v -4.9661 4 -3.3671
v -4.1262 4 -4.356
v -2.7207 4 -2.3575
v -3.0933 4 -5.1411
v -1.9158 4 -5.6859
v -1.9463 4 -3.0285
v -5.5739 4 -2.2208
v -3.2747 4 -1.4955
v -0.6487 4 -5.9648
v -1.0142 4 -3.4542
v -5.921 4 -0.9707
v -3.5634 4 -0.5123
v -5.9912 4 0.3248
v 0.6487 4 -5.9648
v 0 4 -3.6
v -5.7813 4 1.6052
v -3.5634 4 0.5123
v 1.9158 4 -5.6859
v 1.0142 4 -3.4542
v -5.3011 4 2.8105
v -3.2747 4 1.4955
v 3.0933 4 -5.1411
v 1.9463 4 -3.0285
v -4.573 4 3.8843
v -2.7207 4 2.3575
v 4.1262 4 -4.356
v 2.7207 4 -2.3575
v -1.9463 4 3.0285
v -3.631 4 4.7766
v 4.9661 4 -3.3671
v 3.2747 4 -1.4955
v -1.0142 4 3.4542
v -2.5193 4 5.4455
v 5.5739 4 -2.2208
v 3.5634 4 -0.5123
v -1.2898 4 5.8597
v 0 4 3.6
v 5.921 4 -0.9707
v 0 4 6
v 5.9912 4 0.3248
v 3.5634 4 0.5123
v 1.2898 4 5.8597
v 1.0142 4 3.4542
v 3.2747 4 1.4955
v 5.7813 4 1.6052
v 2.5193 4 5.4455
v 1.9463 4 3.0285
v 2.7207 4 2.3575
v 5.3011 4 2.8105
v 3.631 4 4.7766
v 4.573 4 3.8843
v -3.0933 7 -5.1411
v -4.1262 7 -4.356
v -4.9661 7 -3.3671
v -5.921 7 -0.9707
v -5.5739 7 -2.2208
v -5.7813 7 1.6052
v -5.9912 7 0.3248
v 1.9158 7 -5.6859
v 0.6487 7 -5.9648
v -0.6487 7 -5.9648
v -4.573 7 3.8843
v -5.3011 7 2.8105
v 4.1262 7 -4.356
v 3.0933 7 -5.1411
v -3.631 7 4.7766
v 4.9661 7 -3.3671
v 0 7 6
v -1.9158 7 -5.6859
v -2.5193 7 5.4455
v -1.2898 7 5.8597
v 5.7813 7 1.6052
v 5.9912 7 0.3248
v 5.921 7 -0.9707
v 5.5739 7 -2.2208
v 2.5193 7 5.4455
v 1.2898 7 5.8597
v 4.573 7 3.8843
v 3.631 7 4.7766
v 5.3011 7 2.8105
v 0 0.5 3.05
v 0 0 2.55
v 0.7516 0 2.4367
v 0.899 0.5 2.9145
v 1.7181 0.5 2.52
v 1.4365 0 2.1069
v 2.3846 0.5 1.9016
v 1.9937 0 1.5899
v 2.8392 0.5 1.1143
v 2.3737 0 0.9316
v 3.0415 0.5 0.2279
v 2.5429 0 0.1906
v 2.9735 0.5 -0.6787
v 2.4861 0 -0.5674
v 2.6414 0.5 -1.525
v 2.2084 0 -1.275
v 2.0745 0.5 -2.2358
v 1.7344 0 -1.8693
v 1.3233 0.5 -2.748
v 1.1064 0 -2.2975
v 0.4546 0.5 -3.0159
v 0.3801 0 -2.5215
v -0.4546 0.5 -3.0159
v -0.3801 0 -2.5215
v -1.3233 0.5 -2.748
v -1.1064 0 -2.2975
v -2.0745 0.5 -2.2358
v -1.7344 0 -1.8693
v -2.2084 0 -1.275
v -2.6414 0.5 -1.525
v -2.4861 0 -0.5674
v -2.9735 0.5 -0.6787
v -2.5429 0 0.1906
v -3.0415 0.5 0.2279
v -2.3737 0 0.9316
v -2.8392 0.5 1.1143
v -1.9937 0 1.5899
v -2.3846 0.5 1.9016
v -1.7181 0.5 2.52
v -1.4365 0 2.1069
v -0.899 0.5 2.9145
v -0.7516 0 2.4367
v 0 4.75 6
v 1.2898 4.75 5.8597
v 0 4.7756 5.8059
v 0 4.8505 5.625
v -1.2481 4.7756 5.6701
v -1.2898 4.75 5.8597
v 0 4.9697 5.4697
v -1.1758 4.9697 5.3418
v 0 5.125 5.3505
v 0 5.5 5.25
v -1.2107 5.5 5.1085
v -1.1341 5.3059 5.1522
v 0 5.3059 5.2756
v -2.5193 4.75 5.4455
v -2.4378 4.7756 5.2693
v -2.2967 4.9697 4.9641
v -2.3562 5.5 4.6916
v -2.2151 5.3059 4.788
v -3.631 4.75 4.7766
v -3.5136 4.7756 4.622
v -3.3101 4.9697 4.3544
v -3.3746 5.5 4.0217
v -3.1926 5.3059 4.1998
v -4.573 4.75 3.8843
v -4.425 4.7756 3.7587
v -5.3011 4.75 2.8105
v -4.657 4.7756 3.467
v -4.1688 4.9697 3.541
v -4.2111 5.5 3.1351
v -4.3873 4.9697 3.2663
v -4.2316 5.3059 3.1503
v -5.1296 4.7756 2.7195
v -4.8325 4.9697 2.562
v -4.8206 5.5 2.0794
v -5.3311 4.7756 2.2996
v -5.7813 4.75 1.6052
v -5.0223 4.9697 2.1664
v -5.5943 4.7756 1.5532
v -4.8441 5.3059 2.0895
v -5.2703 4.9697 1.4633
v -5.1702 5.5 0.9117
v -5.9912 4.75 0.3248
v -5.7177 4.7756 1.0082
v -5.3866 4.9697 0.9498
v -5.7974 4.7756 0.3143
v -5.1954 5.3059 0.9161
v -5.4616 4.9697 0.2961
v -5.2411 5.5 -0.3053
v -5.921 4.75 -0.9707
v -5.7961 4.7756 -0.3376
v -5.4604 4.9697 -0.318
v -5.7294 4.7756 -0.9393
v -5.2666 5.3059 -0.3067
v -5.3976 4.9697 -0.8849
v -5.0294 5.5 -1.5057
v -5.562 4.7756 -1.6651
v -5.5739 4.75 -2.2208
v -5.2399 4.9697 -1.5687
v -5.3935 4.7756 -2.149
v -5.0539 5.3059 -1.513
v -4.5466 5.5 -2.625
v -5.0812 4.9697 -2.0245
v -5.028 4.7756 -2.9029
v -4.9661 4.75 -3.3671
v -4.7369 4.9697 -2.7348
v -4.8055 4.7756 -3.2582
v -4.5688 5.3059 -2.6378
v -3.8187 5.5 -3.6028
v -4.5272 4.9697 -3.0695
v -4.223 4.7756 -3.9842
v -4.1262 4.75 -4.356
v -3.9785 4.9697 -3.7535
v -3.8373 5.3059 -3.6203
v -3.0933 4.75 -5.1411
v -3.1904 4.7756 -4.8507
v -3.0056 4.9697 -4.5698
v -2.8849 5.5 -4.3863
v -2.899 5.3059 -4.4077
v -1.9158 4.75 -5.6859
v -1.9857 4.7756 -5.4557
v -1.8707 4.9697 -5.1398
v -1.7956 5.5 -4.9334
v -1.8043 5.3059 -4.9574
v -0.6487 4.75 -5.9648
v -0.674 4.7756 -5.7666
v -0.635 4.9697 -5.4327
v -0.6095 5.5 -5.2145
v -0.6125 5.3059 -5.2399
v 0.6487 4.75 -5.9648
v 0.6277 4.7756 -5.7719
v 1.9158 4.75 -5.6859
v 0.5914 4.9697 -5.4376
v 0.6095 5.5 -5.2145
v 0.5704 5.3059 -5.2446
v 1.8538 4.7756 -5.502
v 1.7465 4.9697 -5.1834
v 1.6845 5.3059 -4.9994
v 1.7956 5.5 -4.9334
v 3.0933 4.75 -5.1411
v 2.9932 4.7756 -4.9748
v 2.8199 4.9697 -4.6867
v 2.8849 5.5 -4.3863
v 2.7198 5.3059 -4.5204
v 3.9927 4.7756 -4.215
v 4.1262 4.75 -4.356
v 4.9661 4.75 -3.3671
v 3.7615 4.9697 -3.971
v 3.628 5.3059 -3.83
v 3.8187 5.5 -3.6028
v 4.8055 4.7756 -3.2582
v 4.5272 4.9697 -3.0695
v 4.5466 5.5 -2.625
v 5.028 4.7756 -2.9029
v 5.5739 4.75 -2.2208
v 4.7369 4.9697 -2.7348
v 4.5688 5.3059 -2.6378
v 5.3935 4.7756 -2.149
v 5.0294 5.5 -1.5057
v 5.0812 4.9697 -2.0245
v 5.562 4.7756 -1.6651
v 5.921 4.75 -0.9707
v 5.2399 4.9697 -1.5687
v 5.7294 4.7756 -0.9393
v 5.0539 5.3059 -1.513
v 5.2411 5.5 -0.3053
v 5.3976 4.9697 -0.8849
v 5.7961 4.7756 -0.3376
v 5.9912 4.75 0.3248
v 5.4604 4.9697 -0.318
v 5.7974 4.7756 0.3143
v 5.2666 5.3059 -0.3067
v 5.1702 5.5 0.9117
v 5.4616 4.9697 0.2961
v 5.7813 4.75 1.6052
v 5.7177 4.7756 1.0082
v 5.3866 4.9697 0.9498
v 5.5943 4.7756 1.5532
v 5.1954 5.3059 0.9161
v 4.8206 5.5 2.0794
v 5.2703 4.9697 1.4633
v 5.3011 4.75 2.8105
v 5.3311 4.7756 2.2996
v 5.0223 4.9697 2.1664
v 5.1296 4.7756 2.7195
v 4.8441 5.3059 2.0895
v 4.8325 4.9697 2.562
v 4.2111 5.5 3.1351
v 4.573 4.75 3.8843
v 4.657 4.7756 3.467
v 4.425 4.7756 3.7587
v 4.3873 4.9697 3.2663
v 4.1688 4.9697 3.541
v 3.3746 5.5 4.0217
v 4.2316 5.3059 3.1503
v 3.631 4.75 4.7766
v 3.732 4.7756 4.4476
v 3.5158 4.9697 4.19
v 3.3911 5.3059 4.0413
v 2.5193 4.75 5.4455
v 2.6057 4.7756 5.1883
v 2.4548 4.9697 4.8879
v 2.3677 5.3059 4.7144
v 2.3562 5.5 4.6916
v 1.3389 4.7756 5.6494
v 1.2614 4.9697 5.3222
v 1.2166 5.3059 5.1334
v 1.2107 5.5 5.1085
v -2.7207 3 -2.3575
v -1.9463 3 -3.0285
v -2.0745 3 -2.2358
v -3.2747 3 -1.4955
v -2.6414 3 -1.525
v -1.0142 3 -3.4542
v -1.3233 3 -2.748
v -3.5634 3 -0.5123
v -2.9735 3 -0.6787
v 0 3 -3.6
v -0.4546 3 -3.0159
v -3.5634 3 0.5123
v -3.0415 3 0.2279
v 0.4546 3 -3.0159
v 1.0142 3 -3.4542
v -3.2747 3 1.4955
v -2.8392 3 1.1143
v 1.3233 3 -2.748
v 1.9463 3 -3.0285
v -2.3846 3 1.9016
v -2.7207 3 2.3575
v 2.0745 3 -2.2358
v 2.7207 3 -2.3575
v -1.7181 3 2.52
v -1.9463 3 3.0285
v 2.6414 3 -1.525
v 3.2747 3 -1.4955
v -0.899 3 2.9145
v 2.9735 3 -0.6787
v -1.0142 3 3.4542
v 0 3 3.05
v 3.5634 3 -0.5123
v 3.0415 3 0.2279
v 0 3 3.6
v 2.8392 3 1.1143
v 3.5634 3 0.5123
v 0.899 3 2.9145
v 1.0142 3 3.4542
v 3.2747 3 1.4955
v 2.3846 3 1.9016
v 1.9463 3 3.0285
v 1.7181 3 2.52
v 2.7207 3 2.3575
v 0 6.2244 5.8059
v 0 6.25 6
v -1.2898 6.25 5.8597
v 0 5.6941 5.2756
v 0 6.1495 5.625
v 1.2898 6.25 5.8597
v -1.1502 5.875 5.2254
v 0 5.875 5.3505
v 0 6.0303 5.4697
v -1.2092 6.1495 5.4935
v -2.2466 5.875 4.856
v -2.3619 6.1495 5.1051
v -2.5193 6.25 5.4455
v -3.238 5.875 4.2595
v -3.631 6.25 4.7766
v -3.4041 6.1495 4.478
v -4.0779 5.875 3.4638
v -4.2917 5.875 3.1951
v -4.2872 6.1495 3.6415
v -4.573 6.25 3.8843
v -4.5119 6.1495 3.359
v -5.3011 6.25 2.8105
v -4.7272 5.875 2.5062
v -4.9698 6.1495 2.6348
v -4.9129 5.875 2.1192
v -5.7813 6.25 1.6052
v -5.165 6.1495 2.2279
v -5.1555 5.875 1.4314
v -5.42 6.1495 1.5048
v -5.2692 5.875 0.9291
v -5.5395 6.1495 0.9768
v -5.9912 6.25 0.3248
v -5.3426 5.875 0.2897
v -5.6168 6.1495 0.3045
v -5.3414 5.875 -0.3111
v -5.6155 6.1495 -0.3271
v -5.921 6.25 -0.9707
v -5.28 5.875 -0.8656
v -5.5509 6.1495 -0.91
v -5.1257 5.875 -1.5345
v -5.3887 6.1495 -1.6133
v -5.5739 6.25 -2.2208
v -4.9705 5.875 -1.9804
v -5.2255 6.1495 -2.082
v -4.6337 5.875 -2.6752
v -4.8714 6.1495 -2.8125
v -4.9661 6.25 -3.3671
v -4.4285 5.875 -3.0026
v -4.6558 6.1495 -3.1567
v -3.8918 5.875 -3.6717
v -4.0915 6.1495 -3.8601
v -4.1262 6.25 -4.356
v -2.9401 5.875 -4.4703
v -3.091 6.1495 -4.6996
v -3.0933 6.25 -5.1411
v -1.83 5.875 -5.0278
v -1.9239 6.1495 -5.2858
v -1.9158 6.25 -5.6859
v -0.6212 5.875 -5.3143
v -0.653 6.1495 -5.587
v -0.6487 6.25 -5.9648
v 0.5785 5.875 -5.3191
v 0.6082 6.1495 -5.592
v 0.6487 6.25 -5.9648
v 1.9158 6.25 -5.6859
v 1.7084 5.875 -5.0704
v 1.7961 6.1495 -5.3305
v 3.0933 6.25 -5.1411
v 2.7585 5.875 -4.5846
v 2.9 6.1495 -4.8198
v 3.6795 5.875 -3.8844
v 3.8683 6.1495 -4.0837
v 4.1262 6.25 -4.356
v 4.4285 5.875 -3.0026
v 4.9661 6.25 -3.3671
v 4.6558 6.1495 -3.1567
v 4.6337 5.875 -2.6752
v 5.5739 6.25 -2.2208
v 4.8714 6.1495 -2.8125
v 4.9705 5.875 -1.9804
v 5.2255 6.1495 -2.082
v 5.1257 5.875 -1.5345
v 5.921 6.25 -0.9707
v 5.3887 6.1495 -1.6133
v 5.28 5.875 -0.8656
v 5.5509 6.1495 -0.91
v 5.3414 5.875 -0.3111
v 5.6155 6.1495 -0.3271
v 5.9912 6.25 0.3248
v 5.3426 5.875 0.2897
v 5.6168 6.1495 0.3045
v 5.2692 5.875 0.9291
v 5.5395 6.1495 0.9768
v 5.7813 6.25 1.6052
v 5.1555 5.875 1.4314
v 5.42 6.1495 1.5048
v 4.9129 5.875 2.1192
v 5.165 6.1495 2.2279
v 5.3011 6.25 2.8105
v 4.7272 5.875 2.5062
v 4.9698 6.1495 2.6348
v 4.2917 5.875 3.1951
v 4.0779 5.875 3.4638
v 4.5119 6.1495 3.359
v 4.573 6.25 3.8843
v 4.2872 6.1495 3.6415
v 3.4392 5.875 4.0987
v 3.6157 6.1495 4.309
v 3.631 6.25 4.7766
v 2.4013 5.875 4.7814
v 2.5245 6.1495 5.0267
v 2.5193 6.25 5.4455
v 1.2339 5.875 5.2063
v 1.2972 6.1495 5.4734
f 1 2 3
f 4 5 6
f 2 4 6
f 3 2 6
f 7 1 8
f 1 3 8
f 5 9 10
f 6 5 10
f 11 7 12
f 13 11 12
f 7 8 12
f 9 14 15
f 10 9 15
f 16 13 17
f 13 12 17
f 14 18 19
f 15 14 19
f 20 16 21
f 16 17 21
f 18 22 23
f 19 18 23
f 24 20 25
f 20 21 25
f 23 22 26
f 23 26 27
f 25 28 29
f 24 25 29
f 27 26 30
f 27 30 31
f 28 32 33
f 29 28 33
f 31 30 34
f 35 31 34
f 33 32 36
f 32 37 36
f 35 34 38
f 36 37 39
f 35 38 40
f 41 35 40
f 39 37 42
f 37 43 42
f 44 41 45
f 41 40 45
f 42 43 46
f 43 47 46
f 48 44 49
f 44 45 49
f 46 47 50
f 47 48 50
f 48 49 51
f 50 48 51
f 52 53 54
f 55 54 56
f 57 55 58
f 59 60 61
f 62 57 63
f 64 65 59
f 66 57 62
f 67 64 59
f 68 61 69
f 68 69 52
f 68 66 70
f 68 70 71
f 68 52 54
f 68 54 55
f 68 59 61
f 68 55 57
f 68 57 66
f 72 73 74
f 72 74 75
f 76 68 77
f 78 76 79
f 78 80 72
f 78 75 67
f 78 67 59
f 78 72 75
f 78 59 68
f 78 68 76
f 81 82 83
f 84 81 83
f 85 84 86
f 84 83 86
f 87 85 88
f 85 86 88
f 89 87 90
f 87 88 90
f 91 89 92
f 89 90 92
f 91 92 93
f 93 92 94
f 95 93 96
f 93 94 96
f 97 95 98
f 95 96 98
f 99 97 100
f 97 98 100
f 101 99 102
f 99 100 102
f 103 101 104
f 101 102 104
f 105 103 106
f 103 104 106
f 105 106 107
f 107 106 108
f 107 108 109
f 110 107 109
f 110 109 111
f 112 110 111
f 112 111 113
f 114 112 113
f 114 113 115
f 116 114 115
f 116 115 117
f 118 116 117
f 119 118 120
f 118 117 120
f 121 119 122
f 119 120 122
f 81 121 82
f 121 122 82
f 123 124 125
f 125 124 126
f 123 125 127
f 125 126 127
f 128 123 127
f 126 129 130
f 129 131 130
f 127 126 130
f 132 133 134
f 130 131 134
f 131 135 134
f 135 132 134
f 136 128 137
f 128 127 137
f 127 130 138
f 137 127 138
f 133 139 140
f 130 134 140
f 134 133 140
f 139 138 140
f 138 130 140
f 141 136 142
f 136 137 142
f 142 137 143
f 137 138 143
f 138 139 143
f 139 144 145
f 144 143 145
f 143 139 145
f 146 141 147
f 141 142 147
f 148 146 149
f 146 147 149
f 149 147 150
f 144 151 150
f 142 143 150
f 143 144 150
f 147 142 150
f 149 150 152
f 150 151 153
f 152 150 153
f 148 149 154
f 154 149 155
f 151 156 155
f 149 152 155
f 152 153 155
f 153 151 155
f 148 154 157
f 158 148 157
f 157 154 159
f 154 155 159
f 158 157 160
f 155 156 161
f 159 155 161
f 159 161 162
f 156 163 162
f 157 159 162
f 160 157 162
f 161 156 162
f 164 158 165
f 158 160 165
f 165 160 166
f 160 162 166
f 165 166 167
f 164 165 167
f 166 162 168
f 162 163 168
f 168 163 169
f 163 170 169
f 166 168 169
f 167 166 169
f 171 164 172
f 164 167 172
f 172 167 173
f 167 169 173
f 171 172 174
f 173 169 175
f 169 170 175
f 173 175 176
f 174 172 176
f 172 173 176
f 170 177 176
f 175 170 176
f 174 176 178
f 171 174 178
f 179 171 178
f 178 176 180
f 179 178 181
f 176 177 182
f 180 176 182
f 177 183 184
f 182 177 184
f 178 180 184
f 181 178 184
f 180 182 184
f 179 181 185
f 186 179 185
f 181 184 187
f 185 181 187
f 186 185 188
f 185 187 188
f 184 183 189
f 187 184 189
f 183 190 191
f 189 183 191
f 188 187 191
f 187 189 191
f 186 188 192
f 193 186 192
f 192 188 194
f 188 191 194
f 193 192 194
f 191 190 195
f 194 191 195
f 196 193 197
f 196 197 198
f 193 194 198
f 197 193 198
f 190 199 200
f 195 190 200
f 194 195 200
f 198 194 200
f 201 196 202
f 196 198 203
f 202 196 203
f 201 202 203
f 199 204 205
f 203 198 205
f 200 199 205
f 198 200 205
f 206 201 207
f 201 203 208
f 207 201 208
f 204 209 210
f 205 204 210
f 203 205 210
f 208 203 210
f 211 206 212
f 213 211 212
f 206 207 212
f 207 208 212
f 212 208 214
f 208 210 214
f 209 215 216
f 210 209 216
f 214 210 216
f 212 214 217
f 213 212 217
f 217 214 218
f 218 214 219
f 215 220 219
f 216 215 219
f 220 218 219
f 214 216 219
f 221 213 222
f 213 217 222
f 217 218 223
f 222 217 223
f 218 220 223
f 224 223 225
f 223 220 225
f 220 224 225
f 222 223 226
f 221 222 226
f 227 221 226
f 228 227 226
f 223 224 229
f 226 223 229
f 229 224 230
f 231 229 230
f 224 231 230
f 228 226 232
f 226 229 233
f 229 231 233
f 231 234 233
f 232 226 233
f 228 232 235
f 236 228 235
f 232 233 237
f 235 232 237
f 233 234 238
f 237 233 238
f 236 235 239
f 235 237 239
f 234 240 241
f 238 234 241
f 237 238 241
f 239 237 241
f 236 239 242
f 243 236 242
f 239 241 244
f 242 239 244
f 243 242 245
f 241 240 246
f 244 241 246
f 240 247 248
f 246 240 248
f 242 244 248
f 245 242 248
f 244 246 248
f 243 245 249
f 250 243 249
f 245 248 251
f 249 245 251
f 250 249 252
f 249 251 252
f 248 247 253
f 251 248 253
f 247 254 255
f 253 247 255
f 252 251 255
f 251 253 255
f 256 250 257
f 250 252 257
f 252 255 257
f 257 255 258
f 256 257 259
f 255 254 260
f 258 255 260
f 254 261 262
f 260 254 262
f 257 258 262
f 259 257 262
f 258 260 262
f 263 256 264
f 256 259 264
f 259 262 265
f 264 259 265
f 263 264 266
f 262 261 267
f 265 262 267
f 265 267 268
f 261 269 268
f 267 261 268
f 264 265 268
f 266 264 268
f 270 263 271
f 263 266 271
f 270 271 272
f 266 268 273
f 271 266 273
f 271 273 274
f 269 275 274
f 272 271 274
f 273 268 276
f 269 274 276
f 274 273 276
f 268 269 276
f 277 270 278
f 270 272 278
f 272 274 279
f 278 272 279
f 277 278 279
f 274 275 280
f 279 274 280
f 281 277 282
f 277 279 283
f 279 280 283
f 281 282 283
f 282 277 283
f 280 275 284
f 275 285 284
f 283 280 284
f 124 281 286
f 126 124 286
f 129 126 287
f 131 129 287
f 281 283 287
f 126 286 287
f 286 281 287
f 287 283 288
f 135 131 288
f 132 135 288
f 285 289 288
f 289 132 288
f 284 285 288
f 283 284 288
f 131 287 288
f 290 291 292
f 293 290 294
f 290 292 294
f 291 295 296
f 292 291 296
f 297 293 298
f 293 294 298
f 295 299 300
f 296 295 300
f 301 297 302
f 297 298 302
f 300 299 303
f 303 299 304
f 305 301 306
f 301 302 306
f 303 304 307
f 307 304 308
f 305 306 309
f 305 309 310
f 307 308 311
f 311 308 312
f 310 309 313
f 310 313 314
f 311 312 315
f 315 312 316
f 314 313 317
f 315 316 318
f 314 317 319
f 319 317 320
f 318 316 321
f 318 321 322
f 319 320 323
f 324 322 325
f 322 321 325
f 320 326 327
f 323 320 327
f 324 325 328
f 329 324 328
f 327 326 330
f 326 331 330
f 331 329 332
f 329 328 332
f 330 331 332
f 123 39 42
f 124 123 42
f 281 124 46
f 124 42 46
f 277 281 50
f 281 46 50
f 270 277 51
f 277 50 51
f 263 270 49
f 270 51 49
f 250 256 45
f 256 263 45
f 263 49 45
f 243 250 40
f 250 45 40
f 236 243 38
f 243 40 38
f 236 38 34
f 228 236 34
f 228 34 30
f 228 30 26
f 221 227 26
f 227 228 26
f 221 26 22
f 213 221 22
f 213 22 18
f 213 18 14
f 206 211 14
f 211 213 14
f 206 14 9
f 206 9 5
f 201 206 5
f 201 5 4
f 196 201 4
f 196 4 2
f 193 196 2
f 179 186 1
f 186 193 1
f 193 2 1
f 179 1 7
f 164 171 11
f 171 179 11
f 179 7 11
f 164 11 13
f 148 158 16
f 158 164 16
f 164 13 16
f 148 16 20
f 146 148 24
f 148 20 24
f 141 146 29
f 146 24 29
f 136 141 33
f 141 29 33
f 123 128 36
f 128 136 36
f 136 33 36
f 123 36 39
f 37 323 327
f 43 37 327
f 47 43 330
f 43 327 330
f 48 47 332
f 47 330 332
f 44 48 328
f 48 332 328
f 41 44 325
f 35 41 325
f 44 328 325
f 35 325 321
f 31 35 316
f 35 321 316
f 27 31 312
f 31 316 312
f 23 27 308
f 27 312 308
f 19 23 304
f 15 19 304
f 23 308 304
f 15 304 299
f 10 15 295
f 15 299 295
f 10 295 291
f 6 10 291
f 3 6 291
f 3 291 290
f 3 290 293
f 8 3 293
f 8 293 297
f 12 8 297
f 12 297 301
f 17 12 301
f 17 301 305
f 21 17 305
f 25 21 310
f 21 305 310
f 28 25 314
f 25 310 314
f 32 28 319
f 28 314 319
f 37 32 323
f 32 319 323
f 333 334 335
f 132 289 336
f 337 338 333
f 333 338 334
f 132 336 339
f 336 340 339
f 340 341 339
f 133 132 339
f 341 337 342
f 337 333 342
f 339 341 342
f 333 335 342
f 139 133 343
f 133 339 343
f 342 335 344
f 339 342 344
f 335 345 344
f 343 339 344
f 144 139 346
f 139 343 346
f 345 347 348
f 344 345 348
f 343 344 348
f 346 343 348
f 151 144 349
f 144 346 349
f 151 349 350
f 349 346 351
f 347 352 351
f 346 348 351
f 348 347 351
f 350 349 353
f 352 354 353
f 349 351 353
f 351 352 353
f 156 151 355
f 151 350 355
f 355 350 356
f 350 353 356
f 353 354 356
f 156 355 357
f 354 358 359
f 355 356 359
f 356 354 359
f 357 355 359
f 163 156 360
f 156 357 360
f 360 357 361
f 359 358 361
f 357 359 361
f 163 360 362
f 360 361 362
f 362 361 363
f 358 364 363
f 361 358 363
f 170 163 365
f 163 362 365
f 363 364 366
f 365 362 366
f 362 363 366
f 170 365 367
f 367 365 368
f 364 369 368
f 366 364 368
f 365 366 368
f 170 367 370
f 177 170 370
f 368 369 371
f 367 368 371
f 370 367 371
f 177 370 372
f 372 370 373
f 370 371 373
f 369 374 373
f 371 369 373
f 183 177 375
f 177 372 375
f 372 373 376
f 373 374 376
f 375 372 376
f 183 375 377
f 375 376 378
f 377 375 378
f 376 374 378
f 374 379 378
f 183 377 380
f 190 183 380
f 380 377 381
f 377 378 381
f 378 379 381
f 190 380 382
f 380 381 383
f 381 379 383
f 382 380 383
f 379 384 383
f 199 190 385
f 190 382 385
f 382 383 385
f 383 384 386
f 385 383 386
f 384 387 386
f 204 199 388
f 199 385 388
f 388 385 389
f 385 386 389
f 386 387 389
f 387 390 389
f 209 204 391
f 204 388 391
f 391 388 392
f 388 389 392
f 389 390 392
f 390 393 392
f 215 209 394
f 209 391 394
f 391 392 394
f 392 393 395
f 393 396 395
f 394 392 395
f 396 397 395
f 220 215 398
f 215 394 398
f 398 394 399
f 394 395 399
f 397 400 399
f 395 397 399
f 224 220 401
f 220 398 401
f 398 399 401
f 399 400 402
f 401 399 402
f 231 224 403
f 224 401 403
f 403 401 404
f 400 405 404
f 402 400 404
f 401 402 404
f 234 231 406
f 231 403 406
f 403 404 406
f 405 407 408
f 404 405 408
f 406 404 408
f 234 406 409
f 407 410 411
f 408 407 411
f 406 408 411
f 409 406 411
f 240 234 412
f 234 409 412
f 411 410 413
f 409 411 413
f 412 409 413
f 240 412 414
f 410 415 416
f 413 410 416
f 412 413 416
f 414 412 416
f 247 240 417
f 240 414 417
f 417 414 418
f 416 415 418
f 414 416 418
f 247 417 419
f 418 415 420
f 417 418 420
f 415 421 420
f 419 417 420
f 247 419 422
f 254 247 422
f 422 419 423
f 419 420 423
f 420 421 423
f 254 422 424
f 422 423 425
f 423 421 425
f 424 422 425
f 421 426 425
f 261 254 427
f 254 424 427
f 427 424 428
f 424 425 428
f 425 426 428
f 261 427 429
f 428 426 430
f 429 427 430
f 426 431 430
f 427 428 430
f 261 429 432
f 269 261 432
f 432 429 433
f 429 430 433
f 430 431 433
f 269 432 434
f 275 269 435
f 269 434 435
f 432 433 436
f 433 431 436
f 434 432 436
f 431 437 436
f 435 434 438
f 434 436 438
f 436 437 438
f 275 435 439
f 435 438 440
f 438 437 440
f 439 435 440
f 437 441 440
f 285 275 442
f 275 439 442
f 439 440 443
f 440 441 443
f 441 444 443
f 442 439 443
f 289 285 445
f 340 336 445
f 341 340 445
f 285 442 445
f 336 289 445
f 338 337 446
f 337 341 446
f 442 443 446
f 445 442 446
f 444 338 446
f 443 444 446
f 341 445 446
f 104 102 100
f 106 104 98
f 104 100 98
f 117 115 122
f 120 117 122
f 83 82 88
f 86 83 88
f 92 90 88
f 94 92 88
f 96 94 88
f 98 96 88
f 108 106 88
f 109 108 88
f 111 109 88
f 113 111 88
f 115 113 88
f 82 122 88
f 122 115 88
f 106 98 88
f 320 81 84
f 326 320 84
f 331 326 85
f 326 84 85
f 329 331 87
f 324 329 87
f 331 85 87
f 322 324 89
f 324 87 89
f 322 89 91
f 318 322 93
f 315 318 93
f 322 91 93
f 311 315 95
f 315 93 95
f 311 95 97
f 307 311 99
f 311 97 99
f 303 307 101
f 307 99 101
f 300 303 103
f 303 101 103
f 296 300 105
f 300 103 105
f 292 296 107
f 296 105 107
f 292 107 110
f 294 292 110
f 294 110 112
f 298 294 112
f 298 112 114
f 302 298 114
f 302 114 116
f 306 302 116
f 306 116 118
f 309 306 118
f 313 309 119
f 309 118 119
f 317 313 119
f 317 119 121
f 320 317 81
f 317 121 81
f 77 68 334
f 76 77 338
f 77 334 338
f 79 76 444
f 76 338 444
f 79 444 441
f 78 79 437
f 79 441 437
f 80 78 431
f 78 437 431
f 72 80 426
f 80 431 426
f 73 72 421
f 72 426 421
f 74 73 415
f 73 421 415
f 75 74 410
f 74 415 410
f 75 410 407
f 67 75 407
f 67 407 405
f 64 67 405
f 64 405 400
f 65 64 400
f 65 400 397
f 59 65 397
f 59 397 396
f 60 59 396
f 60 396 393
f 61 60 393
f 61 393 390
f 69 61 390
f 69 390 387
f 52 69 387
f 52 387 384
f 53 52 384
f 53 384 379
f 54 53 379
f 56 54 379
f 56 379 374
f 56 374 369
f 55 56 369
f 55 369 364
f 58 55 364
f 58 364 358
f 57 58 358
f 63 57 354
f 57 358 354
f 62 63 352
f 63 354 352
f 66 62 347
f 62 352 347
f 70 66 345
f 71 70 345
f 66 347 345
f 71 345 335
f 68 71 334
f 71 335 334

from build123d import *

# Parameters (mm, degrees)
SKETCH1_R           = 3.05
BOSS_EXTRUDE1_DEPTH = 3
SKETCH4_R           = 3.6
BOSS_EXTRUDE3_DEPTH = 1
SKETCH2_R           = 6
BOSS_EXTRUDE2_DEPTH = 3
SKETCH3_R           = 0.75
CHAMFER1_SIZE       = 0.5


with BuildPart() as part:
    # Sketch1 → Boss-Extrude1 (new body)
    with BuildSketch(Plane(origin=(0, 0, 0), x_dir=(1, 0, 0), z_dir=(0, 1, 0))):
        with Locations(Location((0, 0, 0), (0, 0, 270))):
            Circle(SKETCH1_R)
    extrude(amount=BOSS_EXTRUDE1_DEPTH)

    # Sketch4 → Boss-Extrude3 (add)
    with BuildSketch(Plane(origin=(0, 3, 0), x_dir=(1, 0, 0), z_dir=(0, 1, 0))):
        with Locations(Location((0, 0, 0), (0, 0, 270))):
            Circle(SKETCH4_R)
    extrude(amount=BOSS_EXTRUDE3_DEPTH)

    # Sketch2 → Boss-Extrude2 (add)
    with BuildSketch(Plane(origin=(0, 4, 0), x_dir=(1, 0, 0), z_dir=(0, 1, 0))):
        with Locations(Location((0, 0, 0), (0, 0, 270))):
            Circle(SKETCH2_R)
    extrude(amount=BOSS_EXTRUDE2_DEPTH)

    # Sketch3 → Cut-Revolve1 (revolve, cut)
    with BuildSketch(Plane.XY, mode=Mode.PRIVATE) as cut_revolve1_sk:
        with Locations((-6, 5.5)):
            Circle(SKETCH3_R)
    revolve(cut_revolve1_sk.sketch.rotate(Axis((0, 9.115200414, 0), (0, -1, 0)), 270), axis=Axis((0, 9.115200414, 0), (0, -1, 0)), mode=Mode.SUBTRACT)

    # Chamfer1
    chamfer1_edges = [part.edges().sort_by_distance(p)[0] for p in [
        (0, 0, -3.05),
    ]]
    chamfer(chamfer1_edges, length=CHAMFER1_SIZE)


solid = part.part
